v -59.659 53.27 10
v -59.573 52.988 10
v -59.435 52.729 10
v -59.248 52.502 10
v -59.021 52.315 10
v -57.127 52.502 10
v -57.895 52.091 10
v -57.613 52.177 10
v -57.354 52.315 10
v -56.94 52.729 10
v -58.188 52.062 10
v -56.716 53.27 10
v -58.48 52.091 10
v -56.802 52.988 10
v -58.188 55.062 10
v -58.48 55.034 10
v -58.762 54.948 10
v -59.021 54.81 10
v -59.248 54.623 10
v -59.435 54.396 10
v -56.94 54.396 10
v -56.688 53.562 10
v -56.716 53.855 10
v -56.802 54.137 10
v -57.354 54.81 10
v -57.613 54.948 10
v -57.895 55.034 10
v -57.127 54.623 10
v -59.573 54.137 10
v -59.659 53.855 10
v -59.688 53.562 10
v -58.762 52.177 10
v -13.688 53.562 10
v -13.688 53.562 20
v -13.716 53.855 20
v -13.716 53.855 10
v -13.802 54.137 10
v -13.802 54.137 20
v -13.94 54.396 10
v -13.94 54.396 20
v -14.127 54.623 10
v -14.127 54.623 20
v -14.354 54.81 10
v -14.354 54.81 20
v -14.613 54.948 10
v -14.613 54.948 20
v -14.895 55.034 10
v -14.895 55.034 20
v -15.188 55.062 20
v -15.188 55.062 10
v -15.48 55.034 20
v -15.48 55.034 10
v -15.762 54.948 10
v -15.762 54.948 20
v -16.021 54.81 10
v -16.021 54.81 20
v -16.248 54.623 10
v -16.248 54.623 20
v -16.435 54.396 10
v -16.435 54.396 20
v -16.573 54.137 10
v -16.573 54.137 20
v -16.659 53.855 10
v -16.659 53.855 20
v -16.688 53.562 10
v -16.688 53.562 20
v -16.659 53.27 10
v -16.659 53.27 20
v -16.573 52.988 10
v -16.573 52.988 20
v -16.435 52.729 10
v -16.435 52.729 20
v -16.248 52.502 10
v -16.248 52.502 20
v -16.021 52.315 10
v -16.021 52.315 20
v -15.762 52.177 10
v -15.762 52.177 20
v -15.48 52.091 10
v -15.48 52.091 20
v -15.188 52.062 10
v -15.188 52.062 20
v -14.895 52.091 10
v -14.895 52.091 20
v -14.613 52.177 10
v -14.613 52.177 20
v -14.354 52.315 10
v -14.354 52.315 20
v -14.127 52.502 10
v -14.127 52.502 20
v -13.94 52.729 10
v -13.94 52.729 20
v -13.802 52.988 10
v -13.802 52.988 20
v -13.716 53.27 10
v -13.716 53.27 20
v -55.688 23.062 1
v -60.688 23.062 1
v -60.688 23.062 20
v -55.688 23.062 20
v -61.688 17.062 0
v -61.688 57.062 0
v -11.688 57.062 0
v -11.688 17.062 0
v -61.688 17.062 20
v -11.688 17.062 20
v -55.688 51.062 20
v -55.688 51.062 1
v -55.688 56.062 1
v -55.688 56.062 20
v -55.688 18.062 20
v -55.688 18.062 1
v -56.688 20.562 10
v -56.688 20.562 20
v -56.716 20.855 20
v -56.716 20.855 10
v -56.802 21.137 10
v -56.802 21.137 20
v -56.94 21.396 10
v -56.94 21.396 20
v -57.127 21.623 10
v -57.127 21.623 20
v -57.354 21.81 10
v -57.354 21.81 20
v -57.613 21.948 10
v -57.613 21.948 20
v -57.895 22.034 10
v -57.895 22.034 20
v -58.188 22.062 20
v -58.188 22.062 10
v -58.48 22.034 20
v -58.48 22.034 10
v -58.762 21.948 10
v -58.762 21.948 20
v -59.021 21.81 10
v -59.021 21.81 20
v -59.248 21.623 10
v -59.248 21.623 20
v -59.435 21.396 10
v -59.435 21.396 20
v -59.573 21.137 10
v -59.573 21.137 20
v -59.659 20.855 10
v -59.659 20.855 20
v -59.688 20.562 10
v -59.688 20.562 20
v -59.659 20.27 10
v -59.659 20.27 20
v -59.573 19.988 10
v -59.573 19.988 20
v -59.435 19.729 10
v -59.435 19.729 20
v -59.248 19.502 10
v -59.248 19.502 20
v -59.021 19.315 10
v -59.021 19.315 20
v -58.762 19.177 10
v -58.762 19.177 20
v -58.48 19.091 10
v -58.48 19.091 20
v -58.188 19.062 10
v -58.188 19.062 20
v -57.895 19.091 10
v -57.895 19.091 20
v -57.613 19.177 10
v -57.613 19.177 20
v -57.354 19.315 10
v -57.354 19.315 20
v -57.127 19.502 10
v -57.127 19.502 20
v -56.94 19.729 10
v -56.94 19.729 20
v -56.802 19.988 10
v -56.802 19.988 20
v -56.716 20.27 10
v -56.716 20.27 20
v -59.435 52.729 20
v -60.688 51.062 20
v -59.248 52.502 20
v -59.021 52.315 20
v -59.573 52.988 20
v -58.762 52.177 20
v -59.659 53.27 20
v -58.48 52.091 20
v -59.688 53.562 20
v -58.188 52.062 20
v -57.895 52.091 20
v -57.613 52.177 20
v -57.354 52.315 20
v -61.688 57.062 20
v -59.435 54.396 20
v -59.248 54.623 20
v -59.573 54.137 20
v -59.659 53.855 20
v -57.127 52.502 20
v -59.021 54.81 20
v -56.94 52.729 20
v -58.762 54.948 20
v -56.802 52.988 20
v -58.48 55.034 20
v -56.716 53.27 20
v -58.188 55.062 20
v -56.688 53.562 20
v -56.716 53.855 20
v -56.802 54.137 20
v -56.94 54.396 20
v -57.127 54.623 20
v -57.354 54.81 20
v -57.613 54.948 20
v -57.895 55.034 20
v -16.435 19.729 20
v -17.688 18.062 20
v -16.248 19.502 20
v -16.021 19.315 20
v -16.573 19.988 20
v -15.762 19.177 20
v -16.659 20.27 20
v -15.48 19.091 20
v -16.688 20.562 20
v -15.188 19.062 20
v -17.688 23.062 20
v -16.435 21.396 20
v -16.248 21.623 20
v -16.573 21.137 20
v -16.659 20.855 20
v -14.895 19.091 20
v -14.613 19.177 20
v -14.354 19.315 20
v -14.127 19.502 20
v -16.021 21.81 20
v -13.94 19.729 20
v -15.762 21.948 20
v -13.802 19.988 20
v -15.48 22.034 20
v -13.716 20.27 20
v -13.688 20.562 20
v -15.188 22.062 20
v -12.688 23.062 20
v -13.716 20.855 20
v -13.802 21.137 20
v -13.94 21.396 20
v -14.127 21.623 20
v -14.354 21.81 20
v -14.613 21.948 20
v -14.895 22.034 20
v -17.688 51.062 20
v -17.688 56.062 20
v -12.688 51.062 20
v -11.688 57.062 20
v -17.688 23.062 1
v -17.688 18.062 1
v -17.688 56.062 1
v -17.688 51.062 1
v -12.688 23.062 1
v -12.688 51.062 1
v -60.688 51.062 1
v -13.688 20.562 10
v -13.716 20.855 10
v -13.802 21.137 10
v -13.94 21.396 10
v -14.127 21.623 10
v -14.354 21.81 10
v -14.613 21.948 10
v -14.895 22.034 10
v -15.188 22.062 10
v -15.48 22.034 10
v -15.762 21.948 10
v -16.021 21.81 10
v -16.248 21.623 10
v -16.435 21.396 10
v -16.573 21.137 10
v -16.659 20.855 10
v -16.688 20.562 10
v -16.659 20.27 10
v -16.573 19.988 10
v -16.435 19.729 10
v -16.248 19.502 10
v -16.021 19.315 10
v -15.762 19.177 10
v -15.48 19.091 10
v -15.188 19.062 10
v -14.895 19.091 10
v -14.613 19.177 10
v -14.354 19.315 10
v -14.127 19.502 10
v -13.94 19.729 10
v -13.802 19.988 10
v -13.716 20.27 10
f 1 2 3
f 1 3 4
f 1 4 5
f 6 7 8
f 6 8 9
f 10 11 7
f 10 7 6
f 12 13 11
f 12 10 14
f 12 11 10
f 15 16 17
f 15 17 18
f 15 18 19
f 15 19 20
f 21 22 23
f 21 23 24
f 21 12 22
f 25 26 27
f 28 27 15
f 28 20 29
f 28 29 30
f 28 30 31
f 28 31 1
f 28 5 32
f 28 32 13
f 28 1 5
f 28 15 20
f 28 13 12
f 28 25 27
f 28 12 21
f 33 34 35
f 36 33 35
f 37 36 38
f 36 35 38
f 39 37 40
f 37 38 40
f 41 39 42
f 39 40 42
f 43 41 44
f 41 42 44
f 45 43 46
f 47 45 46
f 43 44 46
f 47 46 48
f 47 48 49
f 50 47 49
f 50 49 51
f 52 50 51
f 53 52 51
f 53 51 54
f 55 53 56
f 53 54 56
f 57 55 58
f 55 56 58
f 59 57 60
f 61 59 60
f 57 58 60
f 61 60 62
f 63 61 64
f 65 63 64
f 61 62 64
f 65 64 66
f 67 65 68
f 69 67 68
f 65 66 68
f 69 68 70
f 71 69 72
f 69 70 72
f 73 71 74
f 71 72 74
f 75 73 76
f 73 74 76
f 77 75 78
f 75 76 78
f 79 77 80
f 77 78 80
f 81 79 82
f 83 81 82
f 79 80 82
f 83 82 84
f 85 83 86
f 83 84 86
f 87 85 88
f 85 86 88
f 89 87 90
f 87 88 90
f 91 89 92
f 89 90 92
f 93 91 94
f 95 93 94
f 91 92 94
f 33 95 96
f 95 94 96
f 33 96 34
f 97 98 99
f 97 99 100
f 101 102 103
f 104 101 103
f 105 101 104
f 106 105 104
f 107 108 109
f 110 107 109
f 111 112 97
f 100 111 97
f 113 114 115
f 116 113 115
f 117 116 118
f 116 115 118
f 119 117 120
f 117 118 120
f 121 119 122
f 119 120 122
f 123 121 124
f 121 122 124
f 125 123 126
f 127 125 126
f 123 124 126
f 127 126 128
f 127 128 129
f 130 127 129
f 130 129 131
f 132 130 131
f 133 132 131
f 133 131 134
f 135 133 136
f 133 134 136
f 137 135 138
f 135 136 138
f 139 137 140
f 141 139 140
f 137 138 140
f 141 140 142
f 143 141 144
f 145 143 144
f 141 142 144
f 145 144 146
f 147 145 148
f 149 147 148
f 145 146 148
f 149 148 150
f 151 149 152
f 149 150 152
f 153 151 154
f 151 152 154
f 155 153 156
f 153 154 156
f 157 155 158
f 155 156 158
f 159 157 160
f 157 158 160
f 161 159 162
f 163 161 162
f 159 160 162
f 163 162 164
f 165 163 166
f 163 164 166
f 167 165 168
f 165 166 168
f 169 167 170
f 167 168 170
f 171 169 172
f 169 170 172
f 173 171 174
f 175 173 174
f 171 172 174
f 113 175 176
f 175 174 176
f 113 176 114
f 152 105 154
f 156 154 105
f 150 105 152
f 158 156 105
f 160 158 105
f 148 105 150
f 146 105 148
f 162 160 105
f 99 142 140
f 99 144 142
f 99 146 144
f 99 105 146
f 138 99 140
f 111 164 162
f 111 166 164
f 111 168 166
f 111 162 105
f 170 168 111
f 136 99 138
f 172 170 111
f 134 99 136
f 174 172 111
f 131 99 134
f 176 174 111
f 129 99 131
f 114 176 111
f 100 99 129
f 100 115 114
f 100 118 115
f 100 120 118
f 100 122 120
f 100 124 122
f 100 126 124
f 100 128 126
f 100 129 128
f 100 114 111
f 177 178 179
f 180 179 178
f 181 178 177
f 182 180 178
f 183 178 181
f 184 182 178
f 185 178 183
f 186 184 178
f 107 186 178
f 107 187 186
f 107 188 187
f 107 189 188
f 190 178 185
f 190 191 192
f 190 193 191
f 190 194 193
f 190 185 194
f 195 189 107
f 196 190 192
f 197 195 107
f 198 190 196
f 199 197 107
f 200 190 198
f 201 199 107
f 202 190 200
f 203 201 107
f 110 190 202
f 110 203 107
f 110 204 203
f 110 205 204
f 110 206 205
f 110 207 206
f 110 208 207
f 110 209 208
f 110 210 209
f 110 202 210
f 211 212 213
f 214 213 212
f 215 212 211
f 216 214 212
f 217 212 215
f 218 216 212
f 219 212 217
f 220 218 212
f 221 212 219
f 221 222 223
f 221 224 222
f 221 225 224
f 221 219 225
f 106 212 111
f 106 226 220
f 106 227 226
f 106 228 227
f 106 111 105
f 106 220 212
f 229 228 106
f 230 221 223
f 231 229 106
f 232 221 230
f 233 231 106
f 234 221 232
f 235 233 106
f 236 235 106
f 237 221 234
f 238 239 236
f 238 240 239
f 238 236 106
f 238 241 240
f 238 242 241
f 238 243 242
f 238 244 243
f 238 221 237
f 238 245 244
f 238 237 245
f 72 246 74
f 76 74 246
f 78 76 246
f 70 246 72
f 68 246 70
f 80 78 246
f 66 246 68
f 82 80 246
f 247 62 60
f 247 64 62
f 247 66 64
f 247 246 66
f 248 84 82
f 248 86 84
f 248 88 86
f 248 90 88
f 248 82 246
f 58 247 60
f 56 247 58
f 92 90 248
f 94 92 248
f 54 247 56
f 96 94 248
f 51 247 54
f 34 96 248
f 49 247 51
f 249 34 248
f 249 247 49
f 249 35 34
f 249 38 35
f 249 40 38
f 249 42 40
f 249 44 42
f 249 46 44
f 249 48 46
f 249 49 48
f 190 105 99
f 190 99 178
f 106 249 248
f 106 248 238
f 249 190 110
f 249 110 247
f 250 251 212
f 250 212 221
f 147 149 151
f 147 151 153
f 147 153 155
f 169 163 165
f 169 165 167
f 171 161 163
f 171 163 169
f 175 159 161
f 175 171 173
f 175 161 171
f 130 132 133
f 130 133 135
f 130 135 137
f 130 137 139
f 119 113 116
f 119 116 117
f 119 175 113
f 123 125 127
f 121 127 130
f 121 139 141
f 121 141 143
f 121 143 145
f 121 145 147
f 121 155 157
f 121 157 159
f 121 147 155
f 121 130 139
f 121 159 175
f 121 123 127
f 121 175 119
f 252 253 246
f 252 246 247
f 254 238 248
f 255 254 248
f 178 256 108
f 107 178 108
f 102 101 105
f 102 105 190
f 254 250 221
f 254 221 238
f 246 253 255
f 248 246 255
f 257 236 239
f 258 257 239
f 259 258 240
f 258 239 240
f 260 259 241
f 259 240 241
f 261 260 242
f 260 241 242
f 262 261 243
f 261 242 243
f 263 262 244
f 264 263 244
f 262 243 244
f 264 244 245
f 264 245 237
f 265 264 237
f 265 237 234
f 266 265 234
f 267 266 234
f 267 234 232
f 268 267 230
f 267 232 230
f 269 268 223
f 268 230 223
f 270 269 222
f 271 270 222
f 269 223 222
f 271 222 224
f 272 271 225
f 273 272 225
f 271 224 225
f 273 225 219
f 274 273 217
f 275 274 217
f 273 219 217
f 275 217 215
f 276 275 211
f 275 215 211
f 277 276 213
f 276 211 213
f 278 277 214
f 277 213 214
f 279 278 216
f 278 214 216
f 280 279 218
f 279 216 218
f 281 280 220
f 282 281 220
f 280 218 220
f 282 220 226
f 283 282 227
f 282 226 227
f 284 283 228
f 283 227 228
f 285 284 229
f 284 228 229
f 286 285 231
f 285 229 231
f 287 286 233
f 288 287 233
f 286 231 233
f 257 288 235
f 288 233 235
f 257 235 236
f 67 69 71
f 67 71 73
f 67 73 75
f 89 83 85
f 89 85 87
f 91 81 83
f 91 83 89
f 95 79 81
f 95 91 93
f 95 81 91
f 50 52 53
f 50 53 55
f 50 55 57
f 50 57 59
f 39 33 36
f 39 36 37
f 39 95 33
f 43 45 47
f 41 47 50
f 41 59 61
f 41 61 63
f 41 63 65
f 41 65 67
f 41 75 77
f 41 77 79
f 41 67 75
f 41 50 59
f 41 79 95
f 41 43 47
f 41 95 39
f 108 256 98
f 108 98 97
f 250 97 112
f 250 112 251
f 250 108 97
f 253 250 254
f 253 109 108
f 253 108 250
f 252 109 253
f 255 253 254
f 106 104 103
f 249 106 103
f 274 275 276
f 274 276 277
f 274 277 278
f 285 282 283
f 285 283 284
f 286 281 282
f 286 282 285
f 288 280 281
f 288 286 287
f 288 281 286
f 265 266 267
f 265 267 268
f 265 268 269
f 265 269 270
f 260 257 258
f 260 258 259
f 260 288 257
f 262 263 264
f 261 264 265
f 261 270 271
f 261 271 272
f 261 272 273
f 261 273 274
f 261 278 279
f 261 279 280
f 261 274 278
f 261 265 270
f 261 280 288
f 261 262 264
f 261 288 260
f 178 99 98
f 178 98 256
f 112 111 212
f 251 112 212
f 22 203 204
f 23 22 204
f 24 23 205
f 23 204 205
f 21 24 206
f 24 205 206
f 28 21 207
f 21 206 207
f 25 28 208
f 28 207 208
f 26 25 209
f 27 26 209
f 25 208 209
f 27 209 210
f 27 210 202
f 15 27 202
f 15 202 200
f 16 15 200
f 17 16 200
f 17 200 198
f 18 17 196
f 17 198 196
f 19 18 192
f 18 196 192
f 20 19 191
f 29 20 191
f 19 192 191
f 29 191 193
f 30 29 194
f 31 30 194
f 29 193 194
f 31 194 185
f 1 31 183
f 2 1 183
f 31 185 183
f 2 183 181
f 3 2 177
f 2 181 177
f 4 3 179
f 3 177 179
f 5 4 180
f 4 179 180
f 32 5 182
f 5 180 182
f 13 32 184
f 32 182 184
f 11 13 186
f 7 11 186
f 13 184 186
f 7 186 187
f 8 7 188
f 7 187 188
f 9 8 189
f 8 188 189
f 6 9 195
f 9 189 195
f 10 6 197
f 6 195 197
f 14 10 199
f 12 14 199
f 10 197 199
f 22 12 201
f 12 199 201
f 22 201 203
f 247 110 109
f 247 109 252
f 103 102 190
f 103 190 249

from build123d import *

# Parameters (mm, degrees)
F0_W     = 50
F0_H     = 40
F1_DEPTH = 20
F2_W     = 48
F2_H     = 38
F3_DEPTH = 19
F4_W     = 5
F4_H     = 5
F5_DEPTH = 19
F6_R     = 1.5
F7_DEPTH = 10


with BuildPart() as f1:
    # F0 (on Top) → F1 (new body)
    with BuildSketch(Plane.XY):
        with Locations((-36.687503, 37.0625)):
            Rectangle(F0_W, F0_H)
    extrude(amount=F1_DEPTH)

    # F2 (on face) → F3 (cut)
    with BuildSketch(Plane.XY.offset(20)):
        with Locations((-36.687503, 37.0625)):
            Rectangle(F2_W, F2_H)
    extrude(amount=-F3_DEPTH, mode=Mode.SUBTRACT)

    # F4 (on face) → F5 (join)
    with BuildSketch(Plane.XY.offset(1)):
        with Locations((-15.187503, 53.5625)):
            Rectangle(F4_W, F4_H)
        with Locations((-15.187503, 20.5625)):
            Rectangle(F4_W, F4_H)
        with Locations((-58.187503, 20.5625)):
            Rectangle(F4_W, F4_H)
        with Locations((-58.187503, 53.5625)):
            Rectangle(F4_W, F4_H)
    extrude(amount=F5_DEPTH)

    # F6 (on face) → F7 (cut)
    with BuildSketch(Plane.XY.offset(20)):
        with Locations((-15.187503, 53.5625)):
            Circle(F6_R)
        with Locations((-15.187503, 20.5625)):
            Circle(F6_R)
        with Locations((-58.187503, 20.5625)):
            Circle(F6_R)
        with Locations((-58.187503, 53.5625)):
            Circle(F6_R)
    extrude(amount=-F7_DEPTH, mode=Mode.SUBTRACT)


solid = f1.part
